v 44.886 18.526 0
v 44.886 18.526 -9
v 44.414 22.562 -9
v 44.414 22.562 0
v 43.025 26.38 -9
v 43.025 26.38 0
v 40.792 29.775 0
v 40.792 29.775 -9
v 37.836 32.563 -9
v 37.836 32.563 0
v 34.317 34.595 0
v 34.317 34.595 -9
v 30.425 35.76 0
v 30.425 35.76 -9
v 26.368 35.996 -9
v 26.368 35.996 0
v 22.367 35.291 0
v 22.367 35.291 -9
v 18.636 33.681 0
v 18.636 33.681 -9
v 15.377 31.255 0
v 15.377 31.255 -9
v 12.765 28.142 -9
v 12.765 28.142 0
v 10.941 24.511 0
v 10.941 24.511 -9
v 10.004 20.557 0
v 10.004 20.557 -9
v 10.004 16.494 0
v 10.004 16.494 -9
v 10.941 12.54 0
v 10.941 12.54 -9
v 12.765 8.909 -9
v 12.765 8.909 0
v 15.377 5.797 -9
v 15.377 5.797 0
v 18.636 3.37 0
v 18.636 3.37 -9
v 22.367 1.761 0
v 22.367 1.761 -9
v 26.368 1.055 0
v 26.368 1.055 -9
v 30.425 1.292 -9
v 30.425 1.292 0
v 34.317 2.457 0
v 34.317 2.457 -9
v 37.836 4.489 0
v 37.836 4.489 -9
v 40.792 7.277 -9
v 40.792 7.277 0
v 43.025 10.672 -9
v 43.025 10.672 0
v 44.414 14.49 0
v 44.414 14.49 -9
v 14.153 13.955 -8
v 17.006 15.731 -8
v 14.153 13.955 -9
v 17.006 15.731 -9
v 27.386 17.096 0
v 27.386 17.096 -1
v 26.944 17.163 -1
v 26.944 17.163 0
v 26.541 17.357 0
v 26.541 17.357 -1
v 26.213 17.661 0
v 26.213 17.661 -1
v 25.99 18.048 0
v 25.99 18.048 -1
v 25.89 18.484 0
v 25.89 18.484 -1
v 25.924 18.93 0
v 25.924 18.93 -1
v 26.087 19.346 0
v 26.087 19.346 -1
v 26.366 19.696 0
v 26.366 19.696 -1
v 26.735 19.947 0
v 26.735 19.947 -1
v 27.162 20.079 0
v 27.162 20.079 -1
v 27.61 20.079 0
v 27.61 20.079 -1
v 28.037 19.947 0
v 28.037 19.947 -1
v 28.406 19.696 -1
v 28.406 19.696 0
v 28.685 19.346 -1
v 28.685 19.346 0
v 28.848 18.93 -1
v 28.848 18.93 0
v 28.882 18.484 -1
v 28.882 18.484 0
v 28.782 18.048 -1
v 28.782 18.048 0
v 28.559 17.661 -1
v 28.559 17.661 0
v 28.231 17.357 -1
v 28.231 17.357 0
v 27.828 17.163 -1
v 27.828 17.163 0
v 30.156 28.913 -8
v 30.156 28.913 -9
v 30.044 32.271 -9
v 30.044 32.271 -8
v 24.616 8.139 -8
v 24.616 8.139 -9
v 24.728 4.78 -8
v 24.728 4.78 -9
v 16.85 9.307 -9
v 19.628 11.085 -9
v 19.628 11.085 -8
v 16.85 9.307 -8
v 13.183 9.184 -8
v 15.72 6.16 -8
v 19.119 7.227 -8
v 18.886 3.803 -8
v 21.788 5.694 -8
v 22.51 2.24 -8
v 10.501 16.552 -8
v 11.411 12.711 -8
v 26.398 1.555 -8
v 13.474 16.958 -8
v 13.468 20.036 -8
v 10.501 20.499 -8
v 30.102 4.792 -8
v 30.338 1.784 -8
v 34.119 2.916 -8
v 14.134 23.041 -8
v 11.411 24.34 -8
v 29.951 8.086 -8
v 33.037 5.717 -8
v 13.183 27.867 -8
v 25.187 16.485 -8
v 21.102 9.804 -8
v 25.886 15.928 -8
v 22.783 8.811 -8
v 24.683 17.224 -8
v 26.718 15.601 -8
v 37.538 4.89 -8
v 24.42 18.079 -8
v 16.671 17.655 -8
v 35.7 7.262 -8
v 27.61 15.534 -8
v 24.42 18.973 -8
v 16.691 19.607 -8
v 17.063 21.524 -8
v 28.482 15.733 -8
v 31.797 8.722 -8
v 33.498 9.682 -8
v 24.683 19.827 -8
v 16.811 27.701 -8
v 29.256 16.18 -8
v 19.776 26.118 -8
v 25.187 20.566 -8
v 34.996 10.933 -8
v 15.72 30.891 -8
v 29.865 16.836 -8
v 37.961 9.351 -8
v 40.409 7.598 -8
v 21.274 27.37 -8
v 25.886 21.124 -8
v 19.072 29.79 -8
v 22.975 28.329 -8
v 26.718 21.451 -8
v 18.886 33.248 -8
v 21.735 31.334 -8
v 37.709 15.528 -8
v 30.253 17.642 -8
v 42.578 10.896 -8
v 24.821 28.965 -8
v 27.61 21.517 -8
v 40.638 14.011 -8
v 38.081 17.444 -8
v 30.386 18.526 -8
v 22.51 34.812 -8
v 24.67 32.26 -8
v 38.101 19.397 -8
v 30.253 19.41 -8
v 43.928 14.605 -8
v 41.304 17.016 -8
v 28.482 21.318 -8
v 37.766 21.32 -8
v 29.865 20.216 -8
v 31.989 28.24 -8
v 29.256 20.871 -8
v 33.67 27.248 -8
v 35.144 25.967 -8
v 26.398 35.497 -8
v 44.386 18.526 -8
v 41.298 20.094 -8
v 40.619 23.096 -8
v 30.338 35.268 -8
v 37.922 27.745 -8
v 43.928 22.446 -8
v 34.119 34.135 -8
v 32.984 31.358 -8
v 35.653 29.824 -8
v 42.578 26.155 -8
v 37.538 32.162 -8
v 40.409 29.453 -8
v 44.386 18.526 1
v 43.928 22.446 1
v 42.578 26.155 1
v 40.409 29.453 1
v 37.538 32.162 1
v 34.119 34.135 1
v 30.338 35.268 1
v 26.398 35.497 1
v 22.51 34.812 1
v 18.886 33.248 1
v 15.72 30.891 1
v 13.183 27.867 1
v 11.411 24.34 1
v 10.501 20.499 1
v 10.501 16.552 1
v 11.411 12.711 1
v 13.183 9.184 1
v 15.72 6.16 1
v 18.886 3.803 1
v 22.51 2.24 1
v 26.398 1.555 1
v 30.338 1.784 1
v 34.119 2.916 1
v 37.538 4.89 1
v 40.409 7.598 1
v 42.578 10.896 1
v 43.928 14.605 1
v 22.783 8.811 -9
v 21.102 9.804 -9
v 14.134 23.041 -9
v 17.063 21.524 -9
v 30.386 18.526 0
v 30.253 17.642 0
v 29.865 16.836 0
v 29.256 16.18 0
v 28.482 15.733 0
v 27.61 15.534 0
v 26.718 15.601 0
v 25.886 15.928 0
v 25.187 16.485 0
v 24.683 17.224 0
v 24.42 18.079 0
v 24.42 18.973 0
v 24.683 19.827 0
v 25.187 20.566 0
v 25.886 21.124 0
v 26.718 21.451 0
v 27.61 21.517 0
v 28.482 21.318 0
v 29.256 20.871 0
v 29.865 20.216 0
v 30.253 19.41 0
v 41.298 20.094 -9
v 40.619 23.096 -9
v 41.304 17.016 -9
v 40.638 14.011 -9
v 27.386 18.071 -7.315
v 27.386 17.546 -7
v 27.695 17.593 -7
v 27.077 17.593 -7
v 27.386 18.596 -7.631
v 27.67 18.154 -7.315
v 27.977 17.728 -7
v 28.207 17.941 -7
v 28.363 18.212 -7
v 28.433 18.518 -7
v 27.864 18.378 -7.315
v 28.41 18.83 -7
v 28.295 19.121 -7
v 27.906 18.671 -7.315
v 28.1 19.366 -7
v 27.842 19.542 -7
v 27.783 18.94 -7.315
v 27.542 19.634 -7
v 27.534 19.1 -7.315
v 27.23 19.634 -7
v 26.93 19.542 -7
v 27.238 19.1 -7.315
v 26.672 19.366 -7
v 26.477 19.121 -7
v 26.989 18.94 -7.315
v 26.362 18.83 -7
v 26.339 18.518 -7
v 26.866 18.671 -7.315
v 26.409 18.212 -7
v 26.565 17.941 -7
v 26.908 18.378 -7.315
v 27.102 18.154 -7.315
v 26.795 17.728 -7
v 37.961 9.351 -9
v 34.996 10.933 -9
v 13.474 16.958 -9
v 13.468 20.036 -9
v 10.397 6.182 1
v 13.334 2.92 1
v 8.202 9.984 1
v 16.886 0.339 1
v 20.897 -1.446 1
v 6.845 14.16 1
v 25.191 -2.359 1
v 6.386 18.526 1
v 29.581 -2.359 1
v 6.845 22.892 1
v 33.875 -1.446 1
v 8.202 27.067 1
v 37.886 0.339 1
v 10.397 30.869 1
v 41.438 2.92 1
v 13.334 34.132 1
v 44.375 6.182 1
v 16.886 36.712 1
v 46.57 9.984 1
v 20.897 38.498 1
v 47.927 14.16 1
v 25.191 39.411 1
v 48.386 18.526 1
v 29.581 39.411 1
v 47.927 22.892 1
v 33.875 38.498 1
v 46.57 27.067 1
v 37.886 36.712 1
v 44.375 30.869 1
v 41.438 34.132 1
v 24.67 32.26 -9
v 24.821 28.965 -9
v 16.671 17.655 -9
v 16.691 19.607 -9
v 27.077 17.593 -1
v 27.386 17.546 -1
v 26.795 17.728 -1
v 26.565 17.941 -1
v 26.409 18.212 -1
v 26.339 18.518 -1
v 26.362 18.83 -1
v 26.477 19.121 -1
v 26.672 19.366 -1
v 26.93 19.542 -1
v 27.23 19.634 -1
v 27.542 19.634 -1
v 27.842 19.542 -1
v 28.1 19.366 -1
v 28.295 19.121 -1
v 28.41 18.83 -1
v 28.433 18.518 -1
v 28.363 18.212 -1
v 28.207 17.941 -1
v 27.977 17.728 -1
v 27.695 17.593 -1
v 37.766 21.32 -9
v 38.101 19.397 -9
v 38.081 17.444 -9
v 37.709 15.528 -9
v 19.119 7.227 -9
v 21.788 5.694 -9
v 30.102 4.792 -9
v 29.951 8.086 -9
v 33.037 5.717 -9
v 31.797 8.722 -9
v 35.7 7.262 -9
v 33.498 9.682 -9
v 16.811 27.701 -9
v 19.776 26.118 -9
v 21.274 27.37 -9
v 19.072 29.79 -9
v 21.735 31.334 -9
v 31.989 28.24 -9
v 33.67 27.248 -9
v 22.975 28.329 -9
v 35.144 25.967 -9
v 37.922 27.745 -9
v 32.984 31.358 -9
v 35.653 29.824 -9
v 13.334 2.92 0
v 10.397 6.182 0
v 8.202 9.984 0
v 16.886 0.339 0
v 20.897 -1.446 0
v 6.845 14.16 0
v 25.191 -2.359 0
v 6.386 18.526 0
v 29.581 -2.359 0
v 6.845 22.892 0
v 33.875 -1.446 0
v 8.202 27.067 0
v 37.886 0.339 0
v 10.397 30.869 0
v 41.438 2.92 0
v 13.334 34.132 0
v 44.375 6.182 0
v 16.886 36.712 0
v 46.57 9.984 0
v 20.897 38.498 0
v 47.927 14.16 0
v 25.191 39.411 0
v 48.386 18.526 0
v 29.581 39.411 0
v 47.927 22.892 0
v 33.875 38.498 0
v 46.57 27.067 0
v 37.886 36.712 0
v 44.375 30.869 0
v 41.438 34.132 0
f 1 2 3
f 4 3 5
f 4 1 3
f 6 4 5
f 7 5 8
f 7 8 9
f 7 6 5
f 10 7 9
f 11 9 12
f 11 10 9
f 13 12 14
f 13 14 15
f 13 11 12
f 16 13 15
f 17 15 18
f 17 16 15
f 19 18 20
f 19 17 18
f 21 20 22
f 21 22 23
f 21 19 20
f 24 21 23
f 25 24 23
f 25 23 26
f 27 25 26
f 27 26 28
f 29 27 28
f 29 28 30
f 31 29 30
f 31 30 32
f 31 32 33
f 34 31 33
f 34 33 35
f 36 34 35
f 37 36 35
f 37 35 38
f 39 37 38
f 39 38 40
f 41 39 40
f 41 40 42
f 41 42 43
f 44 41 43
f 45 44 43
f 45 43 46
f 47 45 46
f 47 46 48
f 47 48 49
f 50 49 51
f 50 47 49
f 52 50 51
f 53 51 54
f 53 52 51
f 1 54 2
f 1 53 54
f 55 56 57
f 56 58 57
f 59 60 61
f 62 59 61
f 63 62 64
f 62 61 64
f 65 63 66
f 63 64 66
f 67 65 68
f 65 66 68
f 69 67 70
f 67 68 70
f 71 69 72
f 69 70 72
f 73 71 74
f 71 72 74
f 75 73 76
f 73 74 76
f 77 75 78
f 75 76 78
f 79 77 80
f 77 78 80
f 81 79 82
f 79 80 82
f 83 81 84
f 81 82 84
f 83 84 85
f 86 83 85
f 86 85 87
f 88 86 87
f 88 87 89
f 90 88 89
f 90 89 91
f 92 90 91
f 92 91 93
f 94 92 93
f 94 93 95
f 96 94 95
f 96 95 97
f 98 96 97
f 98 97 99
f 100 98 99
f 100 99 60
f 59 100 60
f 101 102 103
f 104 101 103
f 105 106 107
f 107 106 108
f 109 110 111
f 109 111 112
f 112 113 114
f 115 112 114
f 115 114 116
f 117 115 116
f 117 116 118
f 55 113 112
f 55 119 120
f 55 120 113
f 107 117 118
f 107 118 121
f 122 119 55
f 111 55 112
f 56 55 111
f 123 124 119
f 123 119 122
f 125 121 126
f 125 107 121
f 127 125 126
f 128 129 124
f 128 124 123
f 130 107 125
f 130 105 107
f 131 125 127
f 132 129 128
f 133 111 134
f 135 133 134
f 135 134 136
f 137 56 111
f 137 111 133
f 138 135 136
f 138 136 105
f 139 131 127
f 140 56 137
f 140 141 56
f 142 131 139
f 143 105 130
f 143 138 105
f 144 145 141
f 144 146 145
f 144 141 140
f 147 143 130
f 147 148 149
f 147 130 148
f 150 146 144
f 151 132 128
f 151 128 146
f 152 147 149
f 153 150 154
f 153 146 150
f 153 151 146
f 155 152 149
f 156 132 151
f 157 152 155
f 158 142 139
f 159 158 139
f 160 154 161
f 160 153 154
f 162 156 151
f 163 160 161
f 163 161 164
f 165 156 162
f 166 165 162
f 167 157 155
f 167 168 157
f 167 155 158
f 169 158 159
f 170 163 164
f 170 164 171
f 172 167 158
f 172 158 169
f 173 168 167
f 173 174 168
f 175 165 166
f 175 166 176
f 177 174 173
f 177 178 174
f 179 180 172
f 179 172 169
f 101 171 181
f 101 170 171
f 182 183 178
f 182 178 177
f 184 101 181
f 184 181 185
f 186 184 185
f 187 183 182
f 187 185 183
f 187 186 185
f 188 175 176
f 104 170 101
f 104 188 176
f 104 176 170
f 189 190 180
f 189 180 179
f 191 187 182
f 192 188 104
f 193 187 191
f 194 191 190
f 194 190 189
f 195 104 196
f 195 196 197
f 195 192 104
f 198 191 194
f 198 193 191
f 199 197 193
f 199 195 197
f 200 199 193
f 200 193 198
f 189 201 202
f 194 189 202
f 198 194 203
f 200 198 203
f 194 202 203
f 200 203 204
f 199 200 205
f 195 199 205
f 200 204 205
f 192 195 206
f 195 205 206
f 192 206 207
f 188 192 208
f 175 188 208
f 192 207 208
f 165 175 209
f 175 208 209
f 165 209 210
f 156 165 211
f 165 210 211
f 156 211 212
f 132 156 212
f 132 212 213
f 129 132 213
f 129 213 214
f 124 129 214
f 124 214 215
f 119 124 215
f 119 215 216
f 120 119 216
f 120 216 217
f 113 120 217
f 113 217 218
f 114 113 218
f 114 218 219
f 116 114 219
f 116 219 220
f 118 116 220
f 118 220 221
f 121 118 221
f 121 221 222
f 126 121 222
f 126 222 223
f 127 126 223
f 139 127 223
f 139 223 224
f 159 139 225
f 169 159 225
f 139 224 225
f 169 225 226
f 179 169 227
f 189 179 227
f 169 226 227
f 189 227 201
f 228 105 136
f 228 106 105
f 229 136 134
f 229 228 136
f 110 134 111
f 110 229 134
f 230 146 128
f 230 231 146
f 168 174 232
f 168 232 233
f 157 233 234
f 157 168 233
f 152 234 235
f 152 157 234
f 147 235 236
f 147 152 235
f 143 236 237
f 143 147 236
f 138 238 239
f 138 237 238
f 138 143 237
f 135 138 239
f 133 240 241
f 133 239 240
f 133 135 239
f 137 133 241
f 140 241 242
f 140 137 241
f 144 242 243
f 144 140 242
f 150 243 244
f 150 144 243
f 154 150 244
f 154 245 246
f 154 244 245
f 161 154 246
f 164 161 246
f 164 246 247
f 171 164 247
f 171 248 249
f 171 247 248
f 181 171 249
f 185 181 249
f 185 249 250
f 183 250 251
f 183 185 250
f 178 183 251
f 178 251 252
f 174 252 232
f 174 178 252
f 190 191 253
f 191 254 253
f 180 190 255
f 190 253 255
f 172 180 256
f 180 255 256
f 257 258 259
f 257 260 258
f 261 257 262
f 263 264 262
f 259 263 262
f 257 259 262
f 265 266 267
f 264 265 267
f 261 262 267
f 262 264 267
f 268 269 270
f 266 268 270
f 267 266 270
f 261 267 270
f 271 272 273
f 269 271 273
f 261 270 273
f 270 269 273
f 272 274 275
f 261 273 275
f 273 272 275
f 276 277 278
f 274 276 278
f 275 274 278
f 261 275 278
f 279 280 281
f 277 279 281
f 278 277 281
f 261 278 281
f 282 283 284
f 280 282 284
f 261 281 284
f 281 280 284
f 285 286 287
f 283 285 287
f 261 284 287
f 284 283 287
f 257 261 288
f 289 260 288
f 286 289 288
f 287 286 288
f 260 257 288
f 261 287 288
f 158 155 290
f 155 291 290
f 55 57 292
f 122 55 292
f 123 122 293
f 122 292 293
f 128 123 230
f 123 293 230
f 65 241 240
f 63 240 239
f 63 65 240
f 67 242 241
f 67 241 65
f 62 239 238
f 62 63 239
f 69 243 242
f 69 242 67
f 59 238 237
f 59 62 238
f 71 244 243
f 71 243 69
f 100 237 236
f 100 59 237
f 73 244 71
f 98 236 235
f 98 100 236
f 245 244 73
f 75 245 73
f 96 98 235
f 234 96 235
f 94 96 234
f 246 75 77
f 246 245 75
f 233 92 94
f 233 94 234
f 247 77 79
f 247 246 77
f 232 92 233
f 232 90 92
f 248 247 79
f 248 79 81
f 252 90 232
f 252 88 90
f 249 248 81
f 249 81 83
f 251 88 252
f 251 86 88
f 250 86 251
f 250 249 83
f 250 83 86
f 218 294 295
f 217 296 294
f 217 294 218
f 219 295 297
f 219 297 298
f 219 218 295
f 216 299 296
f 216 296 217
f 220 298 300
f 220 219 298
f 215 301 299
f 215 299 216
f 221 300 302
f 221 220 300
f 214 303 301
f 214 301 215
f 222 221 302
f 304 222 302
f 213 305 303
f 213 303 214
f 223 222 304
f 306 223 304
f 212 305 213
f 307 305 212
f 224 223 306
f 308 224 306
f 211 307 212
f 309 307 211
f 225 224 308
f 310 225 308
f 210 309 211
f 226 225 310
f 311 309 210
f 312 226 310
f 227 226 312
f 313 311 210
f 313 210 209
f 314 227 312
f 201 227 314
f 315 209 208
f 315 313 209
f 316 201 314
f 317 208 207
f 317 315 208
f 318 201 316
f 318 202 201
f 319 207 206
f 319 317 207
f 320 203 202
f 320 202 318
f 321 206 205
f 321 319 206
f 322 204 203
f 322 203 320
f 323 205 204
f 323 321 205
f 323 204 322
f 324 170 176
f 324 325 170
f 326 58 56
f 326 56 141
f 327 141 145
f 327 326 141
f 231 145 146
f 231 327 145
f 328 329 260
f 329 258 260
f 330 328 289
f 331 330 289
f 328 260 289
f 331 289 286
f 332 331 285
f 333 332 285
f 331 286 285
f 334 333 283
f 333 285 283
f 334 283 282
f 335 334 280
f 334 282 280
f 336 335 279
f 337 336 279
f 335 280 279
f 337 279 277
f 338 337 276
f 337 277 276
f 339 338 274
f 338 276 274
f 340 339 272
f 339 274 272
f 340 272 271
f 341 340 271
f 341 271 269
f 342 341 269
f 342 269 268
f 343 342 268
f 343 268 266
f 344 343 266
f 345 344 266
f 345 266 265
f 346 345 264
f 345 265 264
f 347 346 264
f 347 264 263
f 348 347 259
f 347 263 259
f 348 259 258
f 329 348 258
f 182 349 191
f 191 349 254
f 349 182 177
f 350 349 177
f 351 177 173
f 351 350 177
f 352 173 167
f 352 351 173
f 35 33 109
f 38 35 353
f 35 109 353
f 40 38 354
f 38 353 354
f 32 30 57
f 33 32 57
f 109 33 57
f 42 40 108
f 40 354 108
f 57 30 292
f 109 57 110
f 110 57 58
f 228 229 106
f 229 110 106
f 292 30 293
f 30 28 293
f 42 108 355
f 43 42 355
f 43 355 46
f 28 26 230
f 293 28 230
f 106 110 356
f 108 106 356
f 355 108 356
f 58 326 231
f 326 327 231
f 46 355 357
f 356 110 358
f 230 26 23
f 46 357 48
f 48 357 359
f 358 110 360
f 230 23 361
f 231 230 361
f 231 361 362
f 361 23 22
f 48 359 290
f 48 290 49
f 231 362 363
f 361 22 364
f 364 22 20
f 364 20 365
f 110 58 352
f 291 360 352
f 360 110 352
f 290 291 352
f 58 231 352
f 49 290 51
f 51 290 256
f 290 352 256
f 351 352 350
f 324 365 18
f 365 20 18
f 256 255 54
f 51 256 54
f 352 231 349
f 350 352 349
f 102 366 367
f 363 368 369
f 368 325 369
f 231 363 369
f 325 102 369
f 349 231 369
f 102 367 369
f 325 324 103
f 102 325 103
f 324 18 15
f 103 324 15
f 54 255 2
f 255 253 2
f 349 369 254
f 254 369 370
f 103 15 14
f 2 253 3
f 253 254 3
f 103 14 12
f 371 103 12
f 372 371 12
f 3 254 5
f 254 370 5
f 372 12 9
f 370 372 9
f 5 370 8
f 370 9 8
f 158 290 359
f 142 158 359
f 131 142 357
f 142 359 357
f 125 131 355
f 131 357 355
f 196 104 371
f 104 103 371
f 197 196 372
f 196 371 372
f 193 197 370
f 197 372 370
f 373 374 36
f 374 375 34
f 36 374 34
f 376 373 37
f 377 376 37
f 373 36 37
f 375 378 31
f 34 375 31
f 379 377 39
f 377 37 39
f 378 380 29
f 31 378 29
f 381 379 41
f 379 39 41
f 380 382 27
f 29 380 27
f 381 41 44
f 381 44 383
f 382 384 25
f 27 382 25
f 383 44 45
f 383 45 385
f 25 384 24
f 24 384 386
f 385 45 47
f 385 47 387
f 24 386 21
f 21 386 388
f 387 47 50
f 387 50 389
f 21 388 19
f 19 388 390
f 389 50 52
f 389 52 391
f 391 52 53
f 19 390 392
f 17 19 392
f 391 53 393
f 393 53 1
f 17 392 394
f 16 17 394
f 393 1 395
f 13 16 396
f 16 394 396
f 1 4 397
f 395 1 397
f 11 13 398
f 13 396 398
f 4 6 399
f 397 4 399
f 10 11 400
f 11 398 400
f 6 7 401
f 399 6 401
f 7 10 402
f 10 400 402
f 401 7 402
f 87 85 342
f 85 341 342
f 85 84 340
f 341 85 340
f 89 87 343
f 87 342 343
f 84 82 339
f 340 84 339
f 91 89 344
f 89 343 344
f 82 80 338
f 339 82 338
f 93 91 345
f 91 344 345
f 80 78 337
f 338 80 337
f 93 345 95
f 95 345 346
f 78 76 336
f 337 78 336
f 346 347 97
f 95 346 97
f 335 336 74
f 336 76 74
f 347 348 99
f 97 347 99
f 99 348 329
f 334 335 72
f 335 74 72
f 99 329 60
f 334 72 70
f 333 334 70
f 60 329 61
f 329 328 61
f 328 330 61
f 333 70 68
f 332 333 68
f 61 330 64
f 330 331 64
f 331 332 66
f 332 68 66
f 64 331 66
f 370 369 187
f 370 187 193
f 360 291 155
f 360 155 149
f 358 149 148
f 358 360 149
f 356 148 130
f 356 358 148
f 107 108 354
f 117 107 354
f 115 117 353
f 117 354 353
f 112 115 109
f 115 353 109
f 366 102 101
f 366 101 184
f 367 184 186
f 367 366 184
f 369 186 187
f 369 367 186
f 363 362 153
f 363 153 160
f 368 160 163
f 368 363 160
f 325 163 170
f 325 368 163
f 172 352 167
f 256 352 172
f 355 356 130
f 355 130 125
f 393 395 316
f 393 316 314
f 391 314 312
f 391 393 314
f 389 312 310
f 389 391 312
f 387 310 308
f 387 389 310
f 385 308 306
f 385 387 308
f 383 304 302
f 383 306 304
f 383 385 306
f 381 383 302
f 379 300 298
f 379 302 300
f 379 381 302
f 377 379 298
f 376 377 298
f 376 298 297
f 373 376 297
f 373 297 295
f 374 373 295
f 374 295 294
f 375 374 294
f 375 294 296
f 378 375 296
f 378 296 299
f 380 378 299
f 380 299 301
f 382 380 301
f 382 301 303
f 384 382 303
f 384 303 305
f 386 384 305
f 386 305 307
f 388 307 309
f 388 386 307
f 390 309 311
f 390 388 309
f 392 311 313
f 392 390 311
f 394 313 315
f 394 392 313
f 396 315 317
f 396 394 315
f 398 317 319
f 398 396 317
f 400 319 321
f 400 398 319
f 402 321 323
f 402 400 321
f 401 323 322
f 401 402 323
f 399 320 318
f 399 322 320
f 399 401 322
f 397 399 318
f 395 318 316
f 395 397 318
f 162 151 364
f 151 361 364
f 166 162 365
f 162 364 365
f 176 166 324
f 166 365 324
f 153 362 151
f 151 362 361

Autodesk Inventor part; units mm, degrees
ref_plane "YZ Plane" through (0, 0, 0) normal (1, 0, 0) x (0, 1, 0)
ref_plane "XZ Plane" through (0, 0, 0) normal (0, 1, 0) x (-1, 0, 0)
ref_plane "XY Plane" through (0, 0, 0) normal (0, 0, 1) x (1, 0, 0)
sketch "Sketch1" plane through (0, 0, 0) normal (0, 0, 1) x (1, 0, 0)
  circle A0 centre (27.386, 18.5258) radius 21
  circle A1 centre (27.386, 18.5258) radius 17
  dimension "d0" = 42
  dimension "d1" = 34
extrude "Outer" add sketch "Sketch1" along normal blind 1
sketch "Sketch2" plane through (27.386, 18.5258, 1) normal (0, 0, 1) x (1, 0, 0)
  circle A0 centre (0, 0) radius 17.5
  dimension "d4" = 35
extrude "Breath_ext_outer" add sketch "Sketch2" against normal blind 10
sketch "Sketch3" plane through (27.386, 18.5258, 1) normal (0, 0, 1) x (1, 0, 0)
  circle A0 centre (0, 0) radius 17
  dimension "d7" = 34
extrude "Breath_ext_inner" cut sketch "Sketch3" against normal blind 9
sketch "Sketch4" plane through (27.386, 18.5258, -9) normal (0, 0, -1) x (-1, 0, 0)
  arc A0 (-10.3804, 2.7946) -> (-10.3234, -2.9983) centre (0, 0) ccw
  arc A1 (-13.233, 4.5704) -> (-13.2519, -4.5152) centre (0, 0) ccw
  line L0 (-10.3234, -2.9983) -> (-13.2519, -4.5152)
  line L1 (-10.3804, 2.7946) -> (-13.233, 4.5704)
  arc A2 (-2.7701, 10.387) -> (-7.7583, 7.4412) centre (0, 0) ccw
  arc A3 (-2.6584, 13.7453) -> (-10.5362, 9.2189) centre (0, 0) ccw
  line L2 (-7.7583, 7.4412) -> (-10.5362, 9.2189)
  line L3 (-2.7701, 10.387) -> (-2.6584, 13.7453)
  arc A4 (7.6104, 7.5924) -> (2.5651, 10.4395) centre (0, 0) ccw
  arc A5 (10.5746, 9.1749) -> (2.7157, 13.7341) centre (0, 0) ccw
  line L4 (2.5651, 10.4395) -> (2.7157, 13.7341)
  line L5 (7.6104, 7.5924) -> (10.5746, 9.1749)
  arc A6 (10.3804, -2.7946) -> (10.3234, 2.9983) centre (0, 0) ccw
  arc A7 (13.233, -4.5704) -> (13.2519, 4.5152) centre (0, 0) ccw
  line L6 (10.3234, 2.9983) -> (13.2519, 4.5152)
  line L7 (10.3804, -2.7946) -> (13.233, -4.5704)
  arc A8 (2.7701, -10.387) -> (7.7583, -7.4412) centre (0, 0) ccw
  arc A9 (2.6584, -13.7453) -> (10.5362, -9.2189) centre (0, 0) ccw
  line L8 (7.7583, -7.4412) -> (10.5362, -9.2189)
  line L9 (2.7701, -10.387) -> (2.6584, -13.7453)
  arc A10 (-7.6104, -7.5924) -> (-2.5651, -10.4395) centre (0, 0) ccw
  arc A11 (-10.5746, -9.1749) -> (-2.7157, -13.7341) centre (0, 0) ccw
  line L10 (-2.5651, -10.4395) -> (-2.7157, -13.7341)
  line L11 (-7.6104, -7.5924) -> (-10.5746, -9.1749)
  dimension "d14" = 360
extrude "Breath_Holes" cut sketch "Sketch4" against normal blind 2
sketch "Sketch5" plane through (27.386, 18.5258, -8) normal (0, 0, 1) x (1, 0, 0)
  circle A0 centre (0, 0) radius 3
  dimension "d18" = 6
extrude "Hole_holder" add sketch "Sketch5" along normal blind 8
sketch "Sketch6" plane through (27.386, 18.5258, 0) normal (0, 0, 1) x (1, 0, 0)
  point P0 (0, 0.0702)
hole "Hole1" at (27.386, 18.596, 0) direction (0, 0, -1) diameter 2.1 depth 7 tip angle 118 counterbore diameter 3 counterbore depth 1
properties part number "mask_breath_top"
